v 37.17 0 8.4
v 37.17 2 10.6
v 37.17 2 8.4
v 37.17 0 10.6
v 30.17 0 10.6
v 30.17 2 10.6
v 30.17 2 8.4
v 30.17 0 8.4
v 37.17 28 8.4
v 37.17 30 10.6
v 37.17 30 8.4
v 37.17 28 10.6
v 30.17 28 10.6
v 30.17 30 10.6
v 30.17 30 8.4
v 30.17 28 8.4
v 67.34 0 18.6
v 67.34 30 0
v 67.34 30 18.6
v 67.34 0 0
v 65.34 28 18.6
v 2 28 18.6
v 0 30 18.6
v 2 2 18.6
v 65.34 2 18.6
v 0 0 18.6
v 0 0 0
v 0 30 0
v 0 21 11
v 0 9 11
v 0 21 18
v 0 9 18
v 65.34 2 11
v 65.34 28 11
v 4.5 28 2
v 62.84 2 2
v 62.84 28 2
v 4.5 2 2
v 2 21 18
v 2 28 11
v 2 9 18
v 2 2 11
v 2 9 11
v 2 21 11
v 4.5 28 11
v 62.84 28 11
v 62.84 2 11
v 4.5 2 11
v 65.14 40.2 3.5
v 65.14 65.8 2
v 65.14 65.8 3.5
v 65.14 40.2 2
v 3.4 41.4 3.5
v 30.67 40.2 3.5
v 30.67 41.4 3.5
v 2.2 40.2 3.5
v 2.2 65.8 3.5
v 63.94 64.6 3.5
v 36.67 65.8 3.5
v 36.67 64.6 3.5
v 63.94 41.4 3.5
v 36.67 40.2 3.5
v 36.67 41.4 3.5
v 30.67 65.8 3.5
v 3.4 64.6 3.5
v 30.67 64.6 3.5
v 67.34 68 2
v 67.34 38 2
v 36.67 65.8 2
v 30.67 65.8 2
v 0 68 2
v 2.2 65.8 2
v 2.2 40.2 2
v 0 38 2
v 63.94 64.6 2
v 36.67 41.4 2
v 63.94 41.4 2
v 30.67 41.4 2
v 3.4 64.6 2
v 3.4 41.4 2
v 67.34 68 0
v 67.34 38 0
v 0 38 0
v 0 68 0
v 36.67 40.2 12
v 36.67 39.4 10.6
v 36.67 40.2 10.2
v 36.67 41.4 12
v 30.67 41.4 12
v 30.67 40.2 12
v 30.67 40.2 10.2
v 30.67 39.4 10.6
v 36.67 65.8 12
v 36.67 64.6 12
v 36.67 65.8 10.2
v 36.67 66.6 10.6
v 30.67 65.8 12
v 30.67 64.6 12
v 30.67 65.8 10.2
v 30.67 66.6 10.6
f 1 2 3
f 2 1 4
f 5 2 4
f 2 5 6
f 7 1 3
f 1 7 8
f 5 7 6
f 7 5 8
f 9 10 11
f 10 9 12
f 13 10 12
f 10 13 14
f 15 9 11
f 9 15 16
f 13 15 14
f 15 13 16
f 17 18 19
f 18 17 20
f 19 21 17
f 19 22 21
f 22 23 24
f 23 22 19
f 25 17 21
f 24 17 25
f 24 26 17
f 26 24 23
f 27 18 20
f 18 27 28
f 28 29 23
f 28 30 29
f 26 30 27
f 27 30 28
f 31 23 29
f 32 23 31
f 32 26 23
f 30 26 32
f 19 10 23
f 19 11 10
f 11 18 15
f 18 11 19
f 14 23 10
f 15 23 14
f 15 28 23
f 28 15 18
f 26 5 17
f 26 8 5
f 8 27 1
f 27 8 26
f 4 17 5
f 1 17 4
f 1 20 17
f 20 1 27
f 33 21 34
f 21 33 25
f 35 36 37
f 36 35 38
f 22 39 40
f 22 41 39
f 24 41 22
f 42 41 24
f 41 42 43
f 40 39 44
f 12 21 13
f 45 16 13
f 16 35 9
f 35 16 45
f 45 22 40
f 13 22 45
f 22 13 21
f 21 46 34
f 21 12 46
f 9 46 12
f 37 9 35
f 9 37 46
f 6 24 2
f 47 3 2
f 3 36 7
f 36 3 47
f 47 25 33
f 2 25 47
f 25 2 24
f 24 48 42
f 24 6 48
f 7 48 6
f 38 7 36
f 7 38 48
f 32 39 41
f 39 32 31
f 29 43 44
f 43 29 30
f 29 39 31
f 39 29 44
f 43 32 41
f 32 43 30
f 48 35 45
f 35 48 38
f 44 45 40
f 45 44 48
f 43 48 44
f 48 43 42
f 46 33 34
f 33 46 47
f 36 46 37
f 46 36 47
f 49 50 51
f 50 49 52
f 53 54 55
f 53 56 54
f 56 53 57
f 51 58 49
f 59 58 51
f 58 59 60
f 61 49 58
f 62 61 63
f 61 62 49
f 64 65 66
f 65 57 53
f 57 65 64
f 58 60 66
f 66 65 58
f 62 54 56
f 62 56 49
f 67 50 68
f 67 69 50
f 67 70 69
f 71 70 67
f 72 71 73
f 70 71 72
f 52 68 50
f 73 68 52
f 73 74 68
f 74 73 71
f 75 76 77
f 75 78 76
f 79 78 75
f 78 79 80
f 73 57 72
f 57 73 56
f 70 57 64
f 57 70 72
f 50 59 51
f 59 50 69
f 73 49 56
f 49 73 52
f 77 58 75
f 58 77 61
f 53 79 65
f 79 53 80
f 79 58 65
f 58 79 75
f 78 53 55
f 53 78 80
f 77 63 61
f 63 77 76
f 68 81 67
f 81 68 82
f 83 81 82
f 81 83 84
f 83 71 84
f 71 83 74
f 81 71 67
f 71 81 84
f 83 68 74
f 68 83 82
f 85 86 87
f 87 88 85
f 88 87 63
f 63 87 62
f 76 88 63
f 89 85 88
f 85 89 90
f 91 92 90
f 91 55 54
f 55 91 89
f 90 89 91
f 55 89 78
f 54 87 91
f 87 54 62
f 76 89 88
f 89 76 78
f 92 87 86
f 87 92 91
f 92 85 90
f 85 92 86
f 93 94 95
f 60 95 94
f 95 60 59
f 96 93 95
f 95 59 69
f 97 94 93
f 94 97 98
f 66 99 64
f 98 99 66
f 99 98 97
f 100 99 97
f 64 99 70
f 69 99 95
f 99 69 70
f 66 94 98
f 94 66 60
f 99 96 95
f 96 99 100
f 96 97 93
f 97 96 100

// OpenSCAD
// esp32_case.scad: a two-part snap-fit case for an ESP32-S3-DevKitC-1 (headers pins down).
// Board size from Espressif's v1.1 drawing (62.74 x 25.40 mm); measure your own board,
// clones differ. The snap arms use the numbers checked by snap_fit.py (L 10, t 1.2, hook 0.8).
//   Render both parts:  openscad -o esp32_case.stl esp32_case.scad
//   Only one part:      openscad -D 'part="base"' -o base.stl esp32_case.scad
//   Interference check: openscad -D 'part="clash"' -o clash.stl esp32_case.scad
//                       (closes the lid on the base; "top level object is empty" = no clash)

part      = "both";   // "base", "lid", "both" (side by side for printing) or "clash"

// --- the board ---
board_l   = 62.74;
board_w   = 25.40;
pins_h    = 9.0;      // header pins below the board, plus a little air
above_h   = 6.0;      // tallest part on top (buttons, module shield) plus air
usb_w     = 12.0;     // opening at one end for the USB cable(s)
usb_h     = 7.0;

// --- the printer ---
clearance = 0.3;      // board-to-wall gap on each side: use your tolerance-gauge result
fit       = 0.2;      // gap between the snap arm and the base wall

// --- the case ---
wall      = 2.0;
floor_t   = 2.0;
lid_t     = 2.0;
ledge     = 2.5;      // the board rests on two ledges at the short ends (pins are on the long edges)
arm_L     = 10.0;     // snap arm length  } keep these in step with snap_fit.py
arm_t     = 1.2;      // snap arm thickness }
hook      = 0.8;      // hook depth        }
arm_b     = 6.0;      // snap arm width

in_l  = board_l + 2 * clearance;
in_w  = board_w + 2 * clearance;
in_h  = pins_h + 1.6 + above_h;           // 1.6 mm board
out_l = in_l + 2 * wall;
out_w = in_w + 2 * wall;
out_h = floor_t + in_h;
win_z = out_h - arm_L - 0.2;              // window in the base wall that the hook clicks into

echo("inside (mm)", in_l, "x", in_w, "x", in_h);
echo("outside, closed (mm)", out_l, "x", out_w, "x", out_h + lid_t);
assert(hook < wall, "the hook must be shallower than the wall it clicks into");

module base() {
  difference() {
    cube([out_l, out_w, out_h]);
    translate([wall, wall, floor_t]) cube([in_l, in_w, in_h + 1]);
    translate([-1, (out_w - usb_w) / 2, floor_t + pins_h]) cube([wall + 2, usb_w, usb_h]);
    for (y = [-1, out_w - wall - 1])                       // windows for the two hooks
      translate([(out_l - arm_b - 1) / 2, y, win_z]) cube([arm_b + 1, wall + 2, 2.2]);
  }
  for (x = [wall, out_l - wall - ledge])                   // ledges at the short ends
    translate([x, wall, floor_t]) cube([ledge, in_w, pins_h]);
}

module lid() {
  cube([out_l, out_w, lid_t]);
  translate([wall + fit, wall + fit, lid_t]) difference() {   // locating lip
    cube([in_l - 2 * fit, in_w - 2 * fit, 1.5]);
    translate([1.2, 1.2, -1]) cube([in_l - 2 * fit - 2.4, in_w - 2 * fit - 2.4, 4]);
  }
}

// The lid prints flat with the arms standing up, so they bend ACROSS the layers (the weak
// direction). If an arm snaps, print the lid on its side or switch to PETG (see the lesson).
module lid_with_arms() {                                  // modelled upside down, as it prints
  lid();
  x0 = (out_l - arm_b) / 2;
  translate([x0, wall + fit, lid_t]) mirror([0, 1, 0]) translate([0, -arm_t, 0]) snap_arm_up();
  translate([x0, out_w - wall - fit - arm_t, lid_t]) snap_arm_up();
}

module snap_arm_up() {                                    // arm along +z, hook on the +y face at the tip
  cube([arm_b, arm_t, arm_L]);
  // hook: 0.4 mm catch face, then a 30 degree lead-in (0.8 / tan 30 = 1.4 mm) down to the tip
  translate([0, arm_t, arm_L - 1.8])
    rotate([90, 0, 90]) linear_extrude(arm_b) polygon([[0, 0], [hook, 0.4], [0, 1.8]]);
}

if (part == "base" || part == "both") base();
if (part == "lid") lid_with_arms();
if (part == "both") translate([0, out_w + 8, 0]) lid_with_arms();
if (part == "clash") intersection() {                     // what the closed lid and base share
  base();
  translate([0, out_w, out_h + lid_t]) rotate([180, 0, 0]) lid_with_arms();
}
